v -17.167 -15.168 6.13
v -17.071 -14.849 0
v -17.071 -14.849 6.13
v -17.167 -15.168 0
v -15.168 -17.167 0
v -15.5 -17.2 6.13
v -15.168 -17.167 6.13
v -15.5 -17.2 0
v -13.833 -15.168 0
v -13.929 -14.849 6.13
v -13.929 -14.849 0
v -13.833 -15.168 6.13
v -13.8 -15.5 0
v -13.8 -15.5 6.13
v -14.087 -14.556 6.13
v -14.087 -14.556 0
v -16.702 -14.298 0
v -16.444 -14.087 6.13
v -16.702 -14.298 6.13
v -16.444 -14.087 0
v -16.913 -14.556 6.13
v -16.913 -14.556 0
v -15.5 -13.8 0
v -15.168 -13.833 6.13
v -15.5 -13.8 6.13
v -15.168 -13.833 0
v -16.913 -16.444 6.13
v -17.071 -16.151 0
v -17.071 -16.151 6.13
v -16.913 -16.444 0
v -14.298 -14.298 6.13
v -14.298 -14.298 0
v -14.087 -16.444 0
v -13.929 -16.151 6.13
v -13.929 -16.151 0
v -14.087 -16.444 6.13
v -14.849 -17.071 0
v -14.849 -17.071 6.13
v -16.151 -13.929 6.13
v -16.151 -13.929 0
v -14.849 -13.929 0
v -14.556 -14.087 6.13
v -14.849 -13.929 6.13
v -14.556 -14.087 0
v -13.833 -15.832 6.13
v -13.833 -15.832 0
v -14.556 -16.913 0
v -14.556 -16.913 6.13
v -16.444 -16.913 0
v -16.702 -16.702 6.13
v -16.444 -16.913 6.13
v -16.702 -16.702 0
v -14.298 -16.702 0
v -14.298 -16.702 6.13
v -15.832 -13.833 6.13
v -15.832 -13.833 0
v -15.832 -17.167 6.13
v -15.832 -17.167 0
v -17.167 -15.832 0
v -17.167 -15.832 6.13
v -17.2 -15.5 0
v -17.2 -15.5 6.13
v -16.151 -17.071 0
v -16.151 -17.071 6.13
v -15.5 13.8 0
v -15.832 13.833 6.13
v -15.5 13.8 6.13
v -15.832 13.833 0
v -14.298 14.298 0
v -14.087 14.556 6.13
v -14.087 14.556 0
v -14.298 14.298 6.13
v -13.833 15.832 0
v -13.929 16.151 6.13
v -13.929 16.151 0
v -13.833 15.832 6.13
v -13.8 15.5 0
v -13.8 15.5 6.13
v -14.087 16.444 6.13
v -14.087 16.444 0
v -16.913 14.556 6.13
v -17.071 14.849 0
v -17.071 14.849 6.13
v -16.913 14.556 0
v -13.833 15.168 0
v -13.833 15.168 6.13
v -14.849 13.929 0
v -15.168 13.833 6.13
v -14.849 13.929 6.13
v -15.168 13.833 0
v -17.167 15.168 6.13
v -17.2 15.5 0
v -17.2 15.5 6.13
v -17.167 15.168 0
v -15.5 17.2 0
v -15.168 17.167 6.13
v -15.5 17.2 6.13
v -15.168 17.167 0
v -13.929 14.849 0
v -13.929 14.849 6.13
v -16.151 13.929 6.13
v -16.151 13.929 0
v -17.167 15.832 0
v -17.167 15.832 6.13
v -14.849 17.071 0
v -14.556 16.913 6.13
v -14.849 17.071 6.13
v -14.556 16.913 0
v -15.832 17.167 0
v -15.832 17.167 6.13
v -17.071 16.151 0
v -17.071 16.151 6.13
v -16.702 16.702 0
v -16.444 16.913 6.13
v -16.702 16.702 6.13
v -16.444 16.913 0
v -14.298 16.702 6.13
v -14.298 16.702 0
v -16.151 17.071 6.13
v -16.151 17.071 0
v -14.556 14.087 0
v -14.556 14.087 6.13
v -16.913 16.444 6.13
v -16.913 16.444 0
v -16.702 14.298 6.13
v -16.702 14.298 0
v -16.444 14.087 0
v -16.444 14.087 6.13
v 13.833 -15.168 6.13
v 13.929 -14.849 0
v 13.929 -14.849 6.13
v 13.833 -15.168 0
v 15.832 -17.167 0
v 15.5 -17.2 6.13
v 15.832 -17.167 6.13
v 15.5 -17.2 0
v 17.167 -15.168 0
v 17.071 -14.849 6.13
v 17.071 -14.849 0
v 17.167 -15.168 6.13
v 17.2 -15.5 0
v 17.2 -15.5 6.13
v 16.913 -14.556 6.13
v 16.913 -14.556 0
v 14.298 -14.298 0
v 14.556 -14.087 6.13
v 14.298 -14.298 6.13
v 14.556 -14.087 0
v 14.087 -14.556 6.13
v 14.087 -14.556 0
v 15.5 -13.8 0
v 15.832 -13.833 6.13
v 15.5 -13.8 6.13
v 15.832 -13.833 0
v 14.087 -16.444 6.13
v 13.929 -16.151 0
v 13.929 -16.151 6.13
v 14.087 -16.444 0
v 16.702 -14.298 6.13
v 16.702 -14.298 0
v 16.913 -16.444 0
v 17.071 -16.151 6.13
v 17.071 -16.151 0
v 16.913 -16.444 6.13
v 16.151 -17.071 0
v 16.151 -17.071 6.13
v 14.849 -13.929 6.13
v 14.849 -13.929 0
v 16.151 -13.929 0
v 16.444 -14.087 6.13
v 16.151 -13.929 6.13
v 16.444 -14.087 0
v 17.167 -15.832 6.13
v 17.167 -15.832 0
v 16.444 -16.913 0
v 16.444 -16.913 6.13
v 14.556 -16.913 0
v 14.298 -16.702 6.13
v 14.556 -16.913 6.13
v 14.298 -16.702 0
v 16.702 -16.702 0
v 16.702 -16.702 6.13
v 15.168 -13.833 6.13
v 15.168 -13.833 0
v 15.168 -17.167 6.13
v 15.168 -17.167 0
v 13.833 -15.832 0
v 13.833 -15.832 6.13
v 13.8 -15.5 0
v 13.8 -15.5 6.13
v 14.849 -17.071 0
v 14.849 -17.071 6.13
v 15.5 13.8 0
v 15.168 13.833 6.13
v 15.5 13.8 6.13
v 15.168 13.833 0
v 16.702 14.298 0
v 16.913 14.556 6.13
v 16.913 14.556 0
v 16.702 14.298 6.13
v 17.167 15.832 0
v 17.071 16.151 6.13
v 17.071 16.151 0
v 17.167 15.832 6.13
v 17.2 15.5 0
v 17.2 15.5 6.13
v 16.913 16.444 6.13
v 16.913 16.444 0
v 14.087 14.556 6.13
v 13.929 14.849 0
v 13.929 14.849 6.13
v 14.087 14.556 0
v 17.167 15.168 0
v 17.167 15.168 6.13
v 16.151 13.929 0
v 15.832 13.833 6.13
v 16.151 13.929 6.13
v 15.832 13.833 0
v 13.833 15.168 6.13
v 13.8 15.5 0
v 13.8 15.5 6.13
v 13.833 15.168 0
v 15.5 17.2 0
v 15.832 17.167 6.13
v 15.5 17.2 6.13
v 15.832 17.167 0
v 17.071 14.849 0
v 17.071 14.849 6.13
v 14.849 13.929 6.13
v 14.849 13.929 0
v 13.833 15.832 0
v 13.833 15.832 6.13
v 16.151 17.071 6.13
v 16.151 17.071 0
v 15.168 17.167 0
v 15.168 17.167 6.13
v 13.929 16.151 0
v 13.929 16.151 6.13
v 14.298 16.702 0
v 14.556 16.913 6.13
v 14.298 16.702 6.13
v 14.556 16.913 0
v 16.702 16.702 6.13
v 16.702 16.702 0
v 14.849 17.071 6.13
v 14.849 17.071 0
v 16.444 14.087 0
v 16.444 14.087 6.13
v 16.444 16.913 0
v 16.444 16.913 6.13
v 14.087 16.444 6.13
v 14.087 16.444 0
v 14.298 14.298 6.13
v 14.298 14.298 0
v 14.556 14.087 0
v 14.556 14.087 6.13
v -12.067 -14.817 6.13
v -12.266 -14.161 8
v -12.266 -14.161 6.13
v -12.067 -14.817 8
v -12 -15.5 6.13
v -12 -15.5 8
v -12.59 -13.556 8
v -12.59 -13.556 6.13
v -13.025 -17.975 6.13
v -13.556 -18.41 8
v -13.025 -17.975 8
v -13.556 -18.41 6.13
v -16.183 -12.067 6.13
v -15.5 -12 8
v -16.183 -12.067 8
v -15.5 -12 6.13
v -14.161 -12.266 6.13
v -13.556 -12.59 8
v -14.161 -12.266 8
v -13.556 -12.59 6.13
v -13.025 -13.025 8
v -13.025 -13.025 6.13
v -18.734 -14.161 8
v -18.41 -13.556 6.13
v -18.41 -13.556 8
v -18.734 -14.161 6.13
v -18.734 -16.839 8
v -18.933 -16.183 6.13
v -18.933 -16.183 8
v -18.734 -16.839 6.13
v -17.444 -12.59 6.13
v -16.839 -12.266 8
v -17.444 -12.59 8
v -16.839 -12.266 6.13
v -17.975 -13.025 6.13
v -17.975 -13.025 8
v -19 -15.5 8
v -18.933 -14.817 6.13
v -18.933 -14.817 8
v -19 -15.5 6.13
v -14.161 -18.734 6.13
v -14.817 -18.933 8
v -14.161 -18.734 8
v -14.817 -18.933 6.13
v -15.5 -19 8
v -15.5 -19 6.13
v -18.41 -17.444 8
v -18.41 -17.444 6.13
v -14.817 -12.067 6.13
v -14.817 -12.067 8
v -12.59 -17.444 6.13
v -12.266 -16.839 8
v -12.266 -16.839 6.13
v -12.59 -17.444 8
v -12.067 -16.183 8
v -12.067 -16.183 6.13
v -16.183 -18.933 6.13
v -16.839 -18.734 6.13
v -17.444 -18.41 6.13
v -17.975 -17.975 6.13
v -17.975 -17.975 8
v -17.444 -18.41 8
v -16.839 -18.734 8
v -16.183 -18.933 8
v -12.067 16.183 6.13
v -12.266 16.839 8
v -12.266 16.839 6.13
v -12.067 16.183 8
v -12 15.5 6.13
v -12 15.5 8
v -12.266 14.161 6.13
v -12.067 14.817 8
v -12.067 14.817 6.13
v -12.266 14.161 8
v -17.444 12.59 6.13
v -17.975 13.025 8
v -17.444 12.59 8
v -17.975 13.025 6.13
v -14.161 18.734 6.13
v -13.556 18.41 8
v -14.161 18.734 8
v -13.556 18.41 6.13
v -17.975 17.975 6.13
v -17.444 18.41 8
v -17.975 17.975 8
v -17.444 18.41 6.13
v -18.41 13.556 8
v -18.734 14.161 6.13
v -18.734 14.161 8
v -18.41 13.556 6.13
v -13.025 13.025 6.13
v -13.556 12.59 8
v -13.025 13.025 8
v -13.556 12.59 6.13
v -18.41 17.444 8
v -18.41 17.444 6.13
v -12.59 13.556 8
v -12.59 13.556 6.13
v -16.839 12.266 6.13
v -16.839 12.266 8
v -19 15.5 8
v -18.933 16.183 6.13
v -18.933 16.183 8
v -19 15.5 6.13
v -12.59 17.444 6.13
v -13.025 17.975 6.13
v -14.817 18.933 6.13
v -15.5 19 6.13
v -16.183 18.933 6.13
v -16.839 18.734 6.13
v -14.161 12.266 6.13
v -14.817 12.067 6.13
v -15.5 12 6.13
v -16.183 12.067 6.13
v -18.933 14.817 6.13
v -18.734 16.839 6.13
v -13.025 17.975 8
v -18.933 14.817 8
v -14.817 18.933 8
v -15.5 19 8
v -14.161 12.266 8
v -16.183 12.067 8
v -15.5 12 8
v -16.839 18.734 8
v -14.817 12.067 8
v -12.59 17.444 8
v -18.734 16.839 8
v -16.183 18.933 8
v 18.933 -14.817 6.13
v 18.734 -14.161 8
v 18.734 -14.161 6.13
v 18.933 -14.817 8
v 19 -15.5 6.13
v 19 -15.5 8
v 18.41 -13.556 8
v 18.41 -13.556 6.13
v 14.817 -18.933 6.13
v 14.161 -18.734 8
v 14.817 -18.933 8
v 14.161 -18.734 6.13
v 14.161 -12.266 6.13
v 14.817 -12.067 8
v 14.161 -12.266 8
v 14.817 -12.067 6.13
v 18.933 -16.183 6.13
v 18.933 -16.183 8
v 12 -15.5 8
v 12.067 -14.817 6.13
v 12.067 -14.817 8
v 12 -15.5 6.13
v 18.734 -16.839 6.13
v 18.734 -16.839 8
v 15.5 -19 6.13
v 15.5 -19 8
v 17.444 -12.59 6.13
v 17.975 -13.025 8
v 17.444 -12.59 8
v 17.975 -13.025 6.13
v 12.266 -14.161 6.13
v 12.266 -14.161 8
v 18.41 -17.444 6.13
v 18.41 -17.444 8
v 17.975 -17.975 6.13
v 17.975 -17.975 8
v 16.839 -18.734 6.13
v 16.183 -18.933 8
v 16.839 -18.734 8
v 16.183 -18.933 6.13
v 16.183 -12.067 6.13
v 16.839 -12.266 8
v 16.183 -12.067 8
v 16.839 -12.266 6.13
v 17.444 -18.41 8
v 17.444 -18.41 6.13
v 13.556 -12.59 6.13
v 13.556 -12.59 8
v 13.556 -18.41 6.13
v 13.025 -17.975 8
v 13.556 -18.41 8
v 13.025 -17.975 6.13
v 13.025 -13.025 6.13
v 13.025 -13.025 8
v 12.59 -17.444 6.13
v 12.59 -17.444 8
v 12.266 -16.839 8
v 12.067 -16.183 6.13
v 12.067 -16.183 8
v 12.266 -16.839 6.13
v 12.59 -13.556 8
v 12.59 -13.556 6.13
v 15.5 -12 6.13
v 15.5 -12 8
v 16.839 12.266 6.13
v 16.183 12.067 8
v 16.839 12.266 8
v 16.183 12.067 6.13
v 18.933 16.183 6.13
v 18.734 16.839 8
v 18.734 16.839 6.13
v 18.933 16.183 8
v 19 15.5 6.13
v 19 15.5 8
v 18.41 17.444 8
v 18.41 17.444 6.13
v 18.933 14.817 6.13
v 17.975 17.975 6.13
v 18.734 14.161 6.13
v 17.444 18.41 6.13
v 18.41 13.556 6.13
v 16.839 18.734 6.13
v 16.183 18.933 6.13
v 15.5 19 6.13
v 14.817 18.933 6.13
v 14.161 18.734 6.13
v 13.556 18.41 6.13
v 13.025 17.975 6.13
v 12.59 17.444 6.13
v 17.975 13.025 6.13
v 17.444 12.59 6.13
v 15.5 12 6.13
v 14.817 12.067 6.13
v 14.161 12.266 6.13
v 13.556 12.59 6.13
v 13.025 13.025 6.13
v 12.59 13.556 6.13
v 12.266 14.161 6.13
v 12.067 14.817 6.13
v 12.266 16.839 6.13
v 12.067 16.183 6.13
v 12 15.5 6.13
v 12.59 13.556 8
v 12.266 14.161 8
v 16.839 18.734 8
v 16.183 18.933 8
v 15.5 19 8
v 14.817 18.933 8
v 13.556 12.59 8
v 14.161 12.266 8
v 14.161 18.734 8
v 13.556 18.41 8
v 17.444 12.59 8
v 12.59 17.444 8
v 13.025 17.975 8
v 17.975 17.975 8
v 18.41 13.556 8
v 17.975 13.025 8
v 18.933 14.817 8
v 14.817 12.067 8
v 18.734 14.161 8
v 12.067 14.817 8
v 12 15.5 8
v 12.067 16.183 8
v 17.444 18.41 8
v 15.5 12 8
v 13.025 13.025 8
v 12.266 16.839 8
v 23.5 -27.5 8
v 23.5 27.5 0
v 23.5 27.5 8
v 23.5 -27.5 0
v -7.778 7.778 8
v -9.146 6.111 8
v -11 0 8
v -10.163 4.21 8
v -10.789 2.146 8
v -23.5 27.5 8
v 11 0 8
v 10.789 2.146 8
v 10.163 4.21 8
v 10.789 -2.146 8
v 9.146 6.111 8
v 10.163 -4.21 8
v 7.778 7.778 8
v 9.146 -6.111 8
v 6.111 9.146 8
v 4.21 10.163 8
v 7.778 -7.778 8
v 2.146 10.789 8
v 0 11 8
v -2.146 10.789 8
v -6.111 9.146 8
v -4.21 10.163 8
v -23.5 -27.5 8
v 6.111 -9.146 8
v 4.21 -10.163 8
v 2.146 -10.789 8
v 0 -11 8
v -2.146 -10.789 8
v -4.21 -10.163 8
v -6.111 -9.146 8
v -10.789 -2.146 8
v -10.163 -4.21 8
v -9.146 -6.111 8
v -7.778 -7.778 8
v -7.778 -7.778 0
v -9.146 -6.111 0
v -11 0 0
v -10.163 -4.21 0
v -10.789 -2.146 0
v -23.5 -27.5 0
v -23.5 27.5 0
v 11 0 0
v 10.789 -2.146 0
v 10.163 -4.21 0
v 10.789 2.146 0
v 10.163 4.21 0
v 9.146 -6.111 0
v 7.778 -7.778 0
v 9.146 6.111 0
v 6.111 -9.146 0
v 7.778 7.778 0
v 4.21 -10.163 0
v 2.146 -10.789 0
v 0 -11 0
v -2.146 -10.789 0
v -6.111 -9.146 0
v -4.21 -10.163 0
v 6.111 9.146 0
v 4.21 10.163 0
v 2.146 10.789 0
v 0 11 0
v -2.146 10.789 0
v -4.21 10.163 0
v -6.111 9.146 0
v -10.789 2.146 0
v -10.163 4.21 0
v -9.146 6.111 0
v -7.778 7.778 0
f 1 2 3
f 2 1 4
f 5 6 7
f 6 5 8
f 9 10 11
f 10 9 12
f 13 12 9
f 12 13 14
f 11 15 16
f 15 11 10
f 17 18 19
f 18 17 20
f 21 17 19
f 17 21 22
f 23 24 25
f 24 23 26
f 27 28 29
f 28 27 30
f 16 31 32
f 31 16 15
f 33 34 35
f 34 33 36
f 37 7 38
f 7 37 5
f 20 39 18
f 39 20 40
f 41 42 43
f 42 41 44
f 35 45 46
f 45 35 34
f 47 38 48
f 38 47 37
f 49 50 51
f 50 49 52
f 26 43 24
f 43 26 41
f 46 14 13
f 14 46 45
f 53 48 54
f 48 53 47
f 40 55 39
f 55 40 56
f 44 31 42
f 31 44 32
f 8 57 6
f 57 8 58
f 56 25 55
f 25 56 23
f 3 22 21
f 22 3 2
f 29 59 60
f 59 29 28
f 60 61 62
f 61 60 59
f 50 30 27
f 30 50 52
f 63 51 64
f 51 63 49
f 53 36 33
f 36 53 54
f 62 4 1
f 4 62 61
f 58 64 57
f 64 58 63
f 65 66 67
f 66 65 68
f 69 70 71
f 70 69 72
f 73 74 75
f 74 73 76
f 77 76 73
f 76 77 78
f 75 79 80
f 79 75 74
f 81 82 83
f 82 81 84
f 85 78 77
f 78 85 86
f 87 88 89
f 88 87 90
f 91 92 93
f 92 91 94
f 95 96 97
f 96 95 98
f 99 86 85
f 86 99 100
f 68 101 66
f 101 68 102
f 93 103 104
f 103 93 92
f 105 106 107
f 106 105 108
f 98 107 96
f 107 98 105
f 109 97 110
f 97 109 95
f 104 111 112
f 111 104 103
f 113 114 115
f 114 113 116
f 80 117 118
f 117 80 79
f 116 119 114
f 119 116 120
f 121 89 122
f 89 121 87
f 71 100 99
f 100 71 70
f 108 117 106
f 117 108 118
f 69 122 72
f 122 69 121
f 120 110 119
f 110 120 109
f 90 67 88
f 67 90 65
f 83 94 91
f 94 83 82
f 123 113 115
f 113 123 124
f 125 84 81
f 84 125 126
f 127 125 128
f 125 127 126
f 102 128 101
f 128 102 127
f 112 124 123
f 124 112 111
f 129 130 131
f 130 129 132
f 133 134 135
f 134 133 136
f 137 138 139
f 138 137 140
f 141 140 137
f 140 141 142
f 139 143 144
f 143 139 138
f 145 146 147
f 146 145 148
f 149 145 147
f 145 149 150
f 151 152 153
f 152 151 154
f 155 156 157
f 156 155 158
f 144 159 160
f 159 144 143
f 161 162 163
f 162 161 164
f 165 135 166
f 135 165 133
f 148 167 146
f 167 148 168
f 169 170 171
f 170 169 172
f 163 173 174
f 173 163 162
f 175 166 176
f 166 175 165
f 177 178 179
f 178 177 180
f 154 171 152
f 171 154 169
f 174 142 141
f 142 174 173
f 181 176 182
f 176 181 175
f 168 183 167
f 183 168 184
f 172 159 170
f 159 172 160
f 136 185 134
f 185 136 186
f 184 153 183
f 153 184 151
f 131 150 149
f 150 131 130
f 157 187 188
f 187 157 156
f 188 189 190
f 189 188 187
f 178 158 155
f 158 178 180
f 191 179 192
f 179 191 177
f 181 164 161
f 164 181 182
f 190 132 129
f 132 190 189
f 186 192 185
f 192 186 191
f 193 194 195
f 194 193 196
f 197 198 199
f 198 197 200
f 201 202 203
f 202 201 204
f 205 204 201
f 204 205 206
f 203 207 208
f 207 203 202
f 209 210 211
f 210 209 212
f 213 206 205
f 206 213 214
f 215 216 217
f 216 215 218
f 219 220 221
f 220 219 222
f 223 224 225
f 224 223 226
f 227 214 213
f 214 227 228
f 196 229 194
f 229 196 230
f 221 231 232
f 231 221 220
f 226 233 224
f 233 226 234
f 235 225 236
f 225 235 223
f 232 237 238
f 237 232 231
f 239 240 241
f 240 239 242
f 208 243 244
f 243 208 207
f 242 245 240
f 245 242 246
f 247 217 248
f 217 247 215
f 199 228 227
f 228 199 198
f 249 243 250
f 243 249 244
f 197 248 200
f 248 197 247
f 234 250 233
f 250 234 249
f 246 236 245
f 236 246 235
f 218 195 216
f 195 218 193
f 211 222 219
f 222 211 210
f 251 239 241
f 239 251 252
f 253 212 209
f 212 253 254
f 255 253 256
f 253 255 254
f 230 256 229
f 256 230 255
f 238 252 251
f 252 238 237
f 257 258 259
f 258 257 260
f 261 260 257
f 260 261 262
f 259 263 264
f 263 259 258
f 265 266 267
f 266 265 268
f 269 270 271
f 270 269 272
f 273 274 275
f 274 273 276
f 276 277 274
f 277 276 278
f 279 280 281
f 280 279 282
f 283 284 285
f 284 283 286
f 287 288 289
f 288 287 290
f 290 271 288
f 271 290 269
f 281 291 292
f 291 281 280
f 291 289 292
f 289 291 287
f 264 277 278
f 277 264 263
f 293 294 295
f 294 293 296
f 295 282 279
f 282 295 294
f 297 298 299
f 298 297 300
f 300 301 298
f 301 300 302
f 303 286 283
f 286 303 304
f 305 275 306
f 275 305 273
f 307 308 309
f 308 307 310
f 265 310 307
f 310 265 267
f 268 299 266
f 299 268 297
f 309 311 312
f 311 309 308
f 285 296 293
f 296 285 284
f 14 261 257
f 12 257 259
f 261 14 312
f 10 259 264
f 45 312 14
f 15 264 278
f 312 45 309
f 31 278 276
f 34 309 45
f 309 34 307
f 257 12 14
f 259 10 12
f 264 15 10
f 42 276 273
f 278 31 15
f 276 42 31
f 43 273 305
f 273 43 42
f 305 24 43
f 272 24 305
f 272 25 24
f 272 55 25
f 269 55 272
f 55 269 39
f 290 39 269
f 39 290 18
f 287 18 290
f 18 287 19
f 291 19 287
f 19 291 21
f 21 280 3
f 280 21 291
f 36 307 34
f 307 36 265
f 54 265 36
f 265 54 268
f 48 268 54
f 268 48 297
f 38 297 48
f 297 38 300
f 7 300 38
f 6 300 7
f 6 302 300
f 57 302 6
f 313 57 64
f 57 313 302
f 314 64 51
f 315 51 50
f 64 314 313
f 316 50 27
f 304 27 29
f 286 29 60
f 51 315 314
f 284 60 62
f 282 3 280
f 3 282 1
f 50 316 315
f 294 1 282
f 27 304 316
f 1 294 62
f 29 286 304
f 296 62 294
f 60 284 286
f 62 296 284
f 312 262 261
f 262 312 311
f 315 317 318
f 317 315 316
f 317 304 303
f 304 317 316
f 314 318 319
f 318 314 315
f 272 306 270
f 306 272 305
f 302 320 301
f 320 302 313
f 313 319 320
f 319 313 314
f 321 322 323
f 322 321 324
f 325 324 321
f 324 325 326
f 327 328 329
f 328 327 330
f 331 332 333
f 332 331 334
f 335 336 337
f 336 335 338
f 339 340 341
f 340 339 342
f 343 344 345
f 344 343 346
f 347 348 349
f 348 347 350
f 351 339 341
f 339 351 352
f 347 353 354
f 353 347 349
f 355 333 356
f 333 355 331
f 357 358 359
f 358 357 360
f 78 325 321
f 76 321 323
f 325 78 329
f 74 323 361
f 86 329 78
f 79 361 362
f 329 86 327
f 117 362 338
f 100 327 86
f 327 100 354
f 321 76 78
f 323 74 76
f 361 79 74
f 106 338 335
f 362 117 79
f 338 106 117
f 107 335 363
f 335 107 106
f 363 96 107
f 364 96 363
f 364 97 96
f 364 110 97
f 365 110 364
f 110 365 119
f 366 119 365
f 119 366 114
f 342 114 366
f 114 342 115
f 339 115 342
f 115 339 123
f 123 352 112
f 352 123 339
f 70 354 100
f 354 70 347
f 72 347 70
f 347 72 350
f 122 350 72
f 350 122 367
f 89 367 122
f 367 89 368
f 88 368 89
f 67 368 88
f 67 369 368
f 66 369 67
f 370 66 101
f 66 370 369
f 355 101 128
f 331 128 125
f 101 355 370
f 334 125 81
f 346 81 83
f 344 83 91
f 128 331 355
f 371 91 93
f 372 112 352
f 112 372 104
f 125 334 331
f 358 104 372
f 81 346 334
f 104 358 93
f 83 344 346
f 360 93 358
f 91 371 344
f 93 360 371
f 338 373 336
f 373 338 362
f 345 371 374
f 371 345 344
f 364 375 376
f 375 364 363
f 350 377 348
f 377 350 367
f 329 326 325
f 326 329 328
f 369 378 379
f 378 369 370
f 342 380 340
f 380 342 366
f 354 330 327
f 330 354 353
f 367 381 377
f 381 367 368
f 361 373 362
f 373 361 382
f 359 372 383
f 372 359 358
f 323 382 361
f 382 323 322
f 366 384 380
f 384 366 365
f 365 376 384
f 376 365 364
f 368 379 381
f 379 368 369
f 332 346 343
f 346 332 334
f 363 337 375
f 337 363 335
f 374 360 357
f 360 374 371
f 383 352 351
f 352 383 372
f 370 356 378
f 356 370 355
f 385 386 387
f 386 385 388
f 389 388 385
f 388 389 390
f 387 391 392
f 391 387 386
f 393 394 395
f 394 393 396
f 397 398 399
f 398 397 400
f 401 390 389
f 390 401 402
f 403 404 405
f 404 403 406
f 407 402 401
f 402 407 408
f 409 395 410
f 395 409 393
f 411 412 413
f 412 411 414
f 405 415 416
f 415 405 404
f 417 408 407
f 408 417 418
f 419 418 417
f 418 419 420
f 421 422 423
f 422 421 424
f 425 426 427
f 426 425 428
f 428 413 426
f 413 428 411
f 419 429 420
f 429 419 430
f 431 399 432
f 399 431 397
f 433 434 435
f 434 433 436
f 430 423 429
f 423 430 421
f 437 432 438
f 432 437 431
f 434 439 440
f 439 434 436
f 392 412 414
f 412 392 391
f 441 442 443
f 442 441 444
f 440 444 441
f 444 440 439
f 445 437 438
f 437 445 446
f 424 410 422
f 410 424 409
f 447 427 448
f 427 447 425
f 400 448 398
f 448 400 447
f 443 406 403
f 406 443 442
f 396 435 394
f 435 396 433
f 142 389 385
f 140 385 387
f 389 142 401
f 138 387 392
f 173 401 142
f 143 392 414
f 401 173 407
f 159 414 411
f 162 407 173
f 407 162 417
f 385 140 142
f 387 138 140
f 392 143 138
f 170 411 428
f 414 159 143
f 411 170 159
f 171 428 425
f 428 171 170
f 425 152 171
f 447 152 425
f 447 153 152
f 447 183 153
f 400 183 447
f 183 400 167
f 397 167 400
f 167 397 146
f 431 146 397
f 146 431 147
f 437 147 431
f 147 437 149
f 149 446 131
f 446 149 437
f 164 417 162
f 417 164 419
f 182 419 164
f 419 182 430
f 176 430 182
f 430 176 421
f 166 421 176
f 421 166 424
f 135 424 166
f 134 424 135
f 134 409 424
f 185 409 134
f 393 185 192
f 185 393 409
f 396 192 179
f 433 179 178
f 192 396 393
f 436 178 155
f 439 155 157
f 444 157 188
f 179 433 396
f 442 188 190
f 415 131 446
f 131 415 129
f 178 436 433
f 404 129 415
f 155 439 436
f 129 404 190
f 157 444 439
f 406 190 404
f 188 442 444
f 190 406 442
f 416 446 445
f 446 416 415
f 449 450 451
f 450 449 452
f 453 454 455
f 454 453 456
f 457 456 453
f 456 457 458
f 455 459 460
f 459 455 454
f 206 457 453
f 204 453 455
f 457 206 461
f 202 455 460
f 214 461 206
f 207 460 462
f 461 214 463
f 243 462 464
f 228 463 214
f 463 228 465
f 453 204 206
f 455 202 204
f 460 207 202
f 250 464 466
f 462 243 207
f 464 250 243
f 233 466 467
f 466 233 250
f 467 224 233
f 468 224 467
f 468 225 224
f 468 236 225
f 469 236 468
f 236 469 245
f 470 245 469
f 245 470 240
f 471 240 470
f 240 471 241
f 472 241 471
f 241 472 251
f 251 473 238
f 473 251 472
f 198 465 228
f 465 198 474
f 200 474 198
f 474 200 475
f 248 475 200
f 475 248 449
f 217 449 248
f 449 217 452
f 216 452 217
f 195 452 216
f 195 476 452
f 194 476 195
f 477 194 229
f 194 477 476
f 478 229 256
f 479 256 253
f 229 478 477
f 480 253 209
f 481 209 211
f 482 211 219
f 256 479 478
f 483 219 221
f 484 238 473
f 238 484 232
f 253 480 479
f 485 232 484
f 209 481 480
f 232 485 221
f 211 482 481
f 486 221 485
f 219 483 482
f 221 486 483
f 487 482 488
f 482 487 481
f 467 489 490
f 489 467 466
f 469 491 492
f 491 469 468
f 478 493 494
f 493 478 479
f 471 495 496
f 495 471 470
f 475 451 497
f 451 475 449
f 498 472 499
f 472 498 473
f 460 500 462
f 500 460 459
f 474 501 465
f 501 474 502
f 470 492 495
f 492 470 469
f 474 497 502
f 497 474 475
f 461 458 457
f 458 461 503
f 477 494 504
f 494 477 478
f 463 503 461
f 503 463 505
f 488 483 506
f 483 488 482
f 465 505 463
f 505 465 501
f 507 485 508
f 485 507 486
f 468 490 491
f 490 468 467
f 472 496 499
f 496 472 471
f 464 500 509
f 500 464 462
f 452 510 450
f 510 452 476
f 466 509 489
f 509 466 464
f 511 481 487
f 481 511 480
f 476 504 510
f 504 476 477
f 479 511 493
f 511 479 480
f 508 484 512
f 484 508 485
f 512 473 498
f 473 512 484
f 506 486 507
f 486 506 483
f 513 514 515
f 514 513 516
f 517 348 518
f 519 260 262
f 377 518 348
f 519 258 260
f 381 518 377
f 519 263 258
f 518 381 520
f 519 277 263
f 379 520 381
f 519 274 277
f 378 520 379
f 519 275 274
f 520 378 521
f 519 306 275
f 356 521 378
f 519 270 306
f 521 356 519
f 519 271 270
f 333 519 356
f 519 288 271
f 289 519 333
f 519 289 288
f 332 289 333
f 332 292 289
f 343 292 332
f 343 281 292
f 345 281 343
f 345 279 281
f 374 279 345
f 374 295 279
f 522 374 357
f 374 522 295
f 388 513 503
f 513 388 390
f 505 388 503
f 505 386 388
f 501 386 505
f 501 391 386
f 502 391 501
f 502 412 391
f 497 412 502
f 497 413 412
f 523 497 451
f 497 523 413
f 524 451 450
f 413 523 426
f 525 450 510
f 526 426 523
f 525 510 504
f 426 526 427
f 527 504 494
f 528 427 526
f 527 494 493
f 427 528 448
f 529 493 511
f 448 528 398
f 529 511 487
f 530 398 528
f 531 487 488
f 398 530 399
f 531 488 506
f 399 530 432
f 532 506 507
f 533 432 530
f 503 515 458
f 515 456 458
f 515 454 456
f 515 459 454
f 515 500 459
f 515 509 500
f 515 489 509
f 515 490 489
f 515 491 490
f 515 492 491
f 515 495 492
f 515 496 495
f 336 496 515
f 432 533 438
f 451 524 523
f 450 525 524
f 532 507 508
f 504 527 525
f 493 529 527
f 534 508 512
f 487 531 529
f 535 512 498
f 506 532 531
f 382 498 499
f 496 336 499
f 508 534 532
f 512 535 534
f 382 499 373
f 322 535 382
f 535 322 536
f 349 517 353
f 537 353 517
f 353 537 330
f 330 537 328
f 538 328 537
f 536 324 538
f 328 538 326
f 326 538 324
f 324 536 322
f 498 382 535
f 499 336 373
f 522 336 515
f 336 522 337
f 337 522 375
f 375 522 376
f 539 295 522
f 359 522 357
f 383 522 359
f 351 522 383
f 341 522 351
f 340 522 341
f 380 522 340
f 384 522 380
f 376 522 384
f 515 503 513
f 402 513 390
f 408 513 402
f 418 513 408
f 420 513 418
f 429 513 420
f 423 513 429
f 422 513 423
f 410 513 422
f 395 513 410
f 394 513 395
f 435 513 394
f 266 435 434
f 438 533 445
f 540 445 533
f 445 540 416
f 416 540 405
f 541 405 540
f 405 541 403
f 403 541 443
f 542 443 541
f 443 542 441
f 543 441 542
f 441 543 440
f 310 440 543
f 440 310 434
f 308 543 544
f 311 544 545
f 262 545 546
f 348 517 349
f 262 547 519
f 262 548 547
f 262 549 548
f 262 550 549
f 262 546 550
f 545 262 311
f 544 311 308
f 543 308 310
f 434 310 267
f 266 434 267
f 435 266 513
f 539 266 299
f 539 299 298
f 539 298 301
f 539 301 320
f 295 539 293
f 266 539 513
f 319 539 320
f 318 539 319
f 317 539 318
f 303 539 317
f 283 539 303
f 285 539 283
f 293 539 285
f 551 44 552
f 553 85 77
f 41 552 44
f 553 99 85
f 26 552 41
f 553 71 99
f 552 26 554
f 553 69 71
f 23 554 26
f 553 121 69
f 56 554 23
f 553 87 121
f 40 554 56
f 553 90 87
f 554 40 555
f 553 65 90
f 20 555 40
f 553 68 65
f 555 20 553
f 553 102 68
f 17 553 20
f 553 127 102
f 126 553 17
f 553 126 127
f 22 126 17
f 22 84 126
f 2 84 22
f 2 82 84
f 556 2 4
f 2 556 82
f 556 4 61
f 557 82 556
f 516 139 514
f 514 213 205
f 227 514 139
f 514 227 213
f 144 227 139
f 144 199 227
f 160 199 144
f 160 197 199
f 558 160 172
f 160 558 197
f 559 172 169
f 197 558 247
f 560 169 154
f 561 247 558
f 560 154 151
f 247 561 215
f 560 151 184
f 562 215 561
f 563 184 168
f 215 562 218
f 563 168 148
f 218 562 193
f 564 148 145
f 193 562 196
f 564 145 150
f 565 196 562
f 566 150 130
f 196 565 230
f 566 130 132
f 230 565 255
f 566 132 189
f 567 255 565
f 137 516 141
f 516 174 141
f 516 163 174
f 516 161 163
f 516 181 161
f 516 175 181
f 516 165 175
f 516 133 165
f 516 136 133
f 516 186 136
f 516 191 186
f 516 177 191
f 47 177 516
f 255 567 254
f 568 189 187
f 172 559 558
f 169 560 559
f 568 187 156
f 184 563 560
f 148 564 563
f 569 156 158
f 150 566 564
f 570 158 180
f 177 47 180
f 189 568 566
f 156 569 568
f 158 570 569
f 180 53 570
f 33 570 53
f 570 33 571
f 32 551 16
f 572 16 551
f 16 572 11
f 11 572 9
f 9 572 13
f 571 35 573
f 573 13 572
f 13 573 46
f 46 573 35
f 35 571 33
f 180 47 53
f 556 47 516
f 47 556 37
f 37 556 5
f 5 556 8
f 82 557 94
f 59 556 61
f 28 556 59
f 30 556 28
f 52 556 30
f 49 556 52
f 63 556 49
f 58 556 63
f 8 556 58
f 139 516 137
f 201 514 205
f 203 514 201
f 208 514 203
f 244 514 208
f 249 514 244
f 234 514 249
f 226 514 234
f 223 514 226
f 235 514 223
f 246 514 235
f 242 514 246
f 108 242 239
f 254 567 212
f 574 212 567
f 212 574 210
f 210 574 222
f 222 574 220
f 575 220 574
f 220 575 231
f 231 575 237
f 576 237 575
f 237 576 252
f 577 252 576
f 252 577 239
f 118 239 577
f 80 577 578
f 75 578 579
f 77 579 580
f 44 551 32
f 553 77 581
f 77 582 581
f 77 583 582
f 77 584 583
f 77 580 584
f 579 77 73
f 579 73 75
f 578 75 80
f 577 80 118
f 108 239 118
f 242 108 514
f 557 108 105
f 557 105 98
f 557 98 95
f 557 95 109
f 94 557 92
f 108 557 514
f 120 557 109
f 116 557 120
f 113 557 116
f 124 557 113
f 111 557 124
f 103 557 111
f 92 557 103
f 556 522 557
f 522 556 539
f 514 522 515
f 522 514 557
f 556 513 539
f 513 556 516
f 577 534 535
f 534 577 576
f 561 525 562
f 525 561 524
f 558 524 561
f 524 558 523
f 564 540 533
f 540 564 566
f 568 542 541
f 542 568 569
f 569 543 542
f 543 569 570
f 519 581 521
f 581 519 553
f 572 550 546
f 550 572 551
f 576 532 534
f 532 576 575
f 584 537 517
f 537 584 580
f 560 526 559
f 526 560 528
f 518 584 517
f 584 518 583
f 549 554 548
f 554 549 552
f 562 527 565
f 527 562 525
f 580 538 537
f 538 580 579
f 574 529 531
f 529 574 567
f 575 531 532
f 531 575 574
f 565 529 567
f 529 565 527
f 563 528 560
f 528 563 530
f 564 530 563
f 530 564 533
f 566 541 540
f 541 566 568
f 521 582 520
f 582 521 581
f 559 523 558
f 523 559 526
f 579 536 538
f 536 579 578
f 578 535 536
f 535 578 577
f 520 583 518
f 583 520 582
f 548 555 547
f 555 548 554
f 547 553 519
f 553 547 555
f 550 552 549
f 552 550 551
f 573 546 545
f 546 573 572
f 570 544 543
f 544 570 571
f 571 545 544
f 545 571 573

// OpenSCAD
$fn = 32;

// ----------------------------------------------------------------------
// Motor mount plate: NEMA17, 47 x 55 x 8 mm
// ----------------------------------------------------------------------

// --- parameters (mm) ---
base_x = 47;              // plate length, X
base_y = 55;              // plate width, Y
thick = 8;                // plate thickness
bolt_pitch = 31;          // NEMA17 bolt spacing
motor_d = 3.4;            // NEMA17 screw clearance
boss_hole = 22;           // pilot boss bore
cb_d = 7;                 // counterbore seat
cb_h = 1.87;              // counterbore depth

module plate() {
  translate([-base_x / 2, -base_y / 2, 0]) cube([base_x, base_y, thick]);
}

module motor_holes() {
  for (sx = [-1, 1]) for (sy = [-1, 1])
    translate([sx * bolt_pitch / 2, sy * bolt_pitch / 2, -1])
      cylinder(h = thick + 2, d = motor_d);
}
module motor_counterbores() {
  for (sx = [-1, 1]) for (sy = [-1, 1])
    translate([sx * bolt_pitch / 2, sy * bolt_pitch / 2, thick - cb_h])
      cylinder(h = cb_h + 0.6, d = cb_d);
}

difference() {
  union() {
    plate();
  }
  motor_holes();
  translate([0, 0, -1]) cylinder(h = thick + 2, d = boss_hole);
  motor_counterbores();
}
